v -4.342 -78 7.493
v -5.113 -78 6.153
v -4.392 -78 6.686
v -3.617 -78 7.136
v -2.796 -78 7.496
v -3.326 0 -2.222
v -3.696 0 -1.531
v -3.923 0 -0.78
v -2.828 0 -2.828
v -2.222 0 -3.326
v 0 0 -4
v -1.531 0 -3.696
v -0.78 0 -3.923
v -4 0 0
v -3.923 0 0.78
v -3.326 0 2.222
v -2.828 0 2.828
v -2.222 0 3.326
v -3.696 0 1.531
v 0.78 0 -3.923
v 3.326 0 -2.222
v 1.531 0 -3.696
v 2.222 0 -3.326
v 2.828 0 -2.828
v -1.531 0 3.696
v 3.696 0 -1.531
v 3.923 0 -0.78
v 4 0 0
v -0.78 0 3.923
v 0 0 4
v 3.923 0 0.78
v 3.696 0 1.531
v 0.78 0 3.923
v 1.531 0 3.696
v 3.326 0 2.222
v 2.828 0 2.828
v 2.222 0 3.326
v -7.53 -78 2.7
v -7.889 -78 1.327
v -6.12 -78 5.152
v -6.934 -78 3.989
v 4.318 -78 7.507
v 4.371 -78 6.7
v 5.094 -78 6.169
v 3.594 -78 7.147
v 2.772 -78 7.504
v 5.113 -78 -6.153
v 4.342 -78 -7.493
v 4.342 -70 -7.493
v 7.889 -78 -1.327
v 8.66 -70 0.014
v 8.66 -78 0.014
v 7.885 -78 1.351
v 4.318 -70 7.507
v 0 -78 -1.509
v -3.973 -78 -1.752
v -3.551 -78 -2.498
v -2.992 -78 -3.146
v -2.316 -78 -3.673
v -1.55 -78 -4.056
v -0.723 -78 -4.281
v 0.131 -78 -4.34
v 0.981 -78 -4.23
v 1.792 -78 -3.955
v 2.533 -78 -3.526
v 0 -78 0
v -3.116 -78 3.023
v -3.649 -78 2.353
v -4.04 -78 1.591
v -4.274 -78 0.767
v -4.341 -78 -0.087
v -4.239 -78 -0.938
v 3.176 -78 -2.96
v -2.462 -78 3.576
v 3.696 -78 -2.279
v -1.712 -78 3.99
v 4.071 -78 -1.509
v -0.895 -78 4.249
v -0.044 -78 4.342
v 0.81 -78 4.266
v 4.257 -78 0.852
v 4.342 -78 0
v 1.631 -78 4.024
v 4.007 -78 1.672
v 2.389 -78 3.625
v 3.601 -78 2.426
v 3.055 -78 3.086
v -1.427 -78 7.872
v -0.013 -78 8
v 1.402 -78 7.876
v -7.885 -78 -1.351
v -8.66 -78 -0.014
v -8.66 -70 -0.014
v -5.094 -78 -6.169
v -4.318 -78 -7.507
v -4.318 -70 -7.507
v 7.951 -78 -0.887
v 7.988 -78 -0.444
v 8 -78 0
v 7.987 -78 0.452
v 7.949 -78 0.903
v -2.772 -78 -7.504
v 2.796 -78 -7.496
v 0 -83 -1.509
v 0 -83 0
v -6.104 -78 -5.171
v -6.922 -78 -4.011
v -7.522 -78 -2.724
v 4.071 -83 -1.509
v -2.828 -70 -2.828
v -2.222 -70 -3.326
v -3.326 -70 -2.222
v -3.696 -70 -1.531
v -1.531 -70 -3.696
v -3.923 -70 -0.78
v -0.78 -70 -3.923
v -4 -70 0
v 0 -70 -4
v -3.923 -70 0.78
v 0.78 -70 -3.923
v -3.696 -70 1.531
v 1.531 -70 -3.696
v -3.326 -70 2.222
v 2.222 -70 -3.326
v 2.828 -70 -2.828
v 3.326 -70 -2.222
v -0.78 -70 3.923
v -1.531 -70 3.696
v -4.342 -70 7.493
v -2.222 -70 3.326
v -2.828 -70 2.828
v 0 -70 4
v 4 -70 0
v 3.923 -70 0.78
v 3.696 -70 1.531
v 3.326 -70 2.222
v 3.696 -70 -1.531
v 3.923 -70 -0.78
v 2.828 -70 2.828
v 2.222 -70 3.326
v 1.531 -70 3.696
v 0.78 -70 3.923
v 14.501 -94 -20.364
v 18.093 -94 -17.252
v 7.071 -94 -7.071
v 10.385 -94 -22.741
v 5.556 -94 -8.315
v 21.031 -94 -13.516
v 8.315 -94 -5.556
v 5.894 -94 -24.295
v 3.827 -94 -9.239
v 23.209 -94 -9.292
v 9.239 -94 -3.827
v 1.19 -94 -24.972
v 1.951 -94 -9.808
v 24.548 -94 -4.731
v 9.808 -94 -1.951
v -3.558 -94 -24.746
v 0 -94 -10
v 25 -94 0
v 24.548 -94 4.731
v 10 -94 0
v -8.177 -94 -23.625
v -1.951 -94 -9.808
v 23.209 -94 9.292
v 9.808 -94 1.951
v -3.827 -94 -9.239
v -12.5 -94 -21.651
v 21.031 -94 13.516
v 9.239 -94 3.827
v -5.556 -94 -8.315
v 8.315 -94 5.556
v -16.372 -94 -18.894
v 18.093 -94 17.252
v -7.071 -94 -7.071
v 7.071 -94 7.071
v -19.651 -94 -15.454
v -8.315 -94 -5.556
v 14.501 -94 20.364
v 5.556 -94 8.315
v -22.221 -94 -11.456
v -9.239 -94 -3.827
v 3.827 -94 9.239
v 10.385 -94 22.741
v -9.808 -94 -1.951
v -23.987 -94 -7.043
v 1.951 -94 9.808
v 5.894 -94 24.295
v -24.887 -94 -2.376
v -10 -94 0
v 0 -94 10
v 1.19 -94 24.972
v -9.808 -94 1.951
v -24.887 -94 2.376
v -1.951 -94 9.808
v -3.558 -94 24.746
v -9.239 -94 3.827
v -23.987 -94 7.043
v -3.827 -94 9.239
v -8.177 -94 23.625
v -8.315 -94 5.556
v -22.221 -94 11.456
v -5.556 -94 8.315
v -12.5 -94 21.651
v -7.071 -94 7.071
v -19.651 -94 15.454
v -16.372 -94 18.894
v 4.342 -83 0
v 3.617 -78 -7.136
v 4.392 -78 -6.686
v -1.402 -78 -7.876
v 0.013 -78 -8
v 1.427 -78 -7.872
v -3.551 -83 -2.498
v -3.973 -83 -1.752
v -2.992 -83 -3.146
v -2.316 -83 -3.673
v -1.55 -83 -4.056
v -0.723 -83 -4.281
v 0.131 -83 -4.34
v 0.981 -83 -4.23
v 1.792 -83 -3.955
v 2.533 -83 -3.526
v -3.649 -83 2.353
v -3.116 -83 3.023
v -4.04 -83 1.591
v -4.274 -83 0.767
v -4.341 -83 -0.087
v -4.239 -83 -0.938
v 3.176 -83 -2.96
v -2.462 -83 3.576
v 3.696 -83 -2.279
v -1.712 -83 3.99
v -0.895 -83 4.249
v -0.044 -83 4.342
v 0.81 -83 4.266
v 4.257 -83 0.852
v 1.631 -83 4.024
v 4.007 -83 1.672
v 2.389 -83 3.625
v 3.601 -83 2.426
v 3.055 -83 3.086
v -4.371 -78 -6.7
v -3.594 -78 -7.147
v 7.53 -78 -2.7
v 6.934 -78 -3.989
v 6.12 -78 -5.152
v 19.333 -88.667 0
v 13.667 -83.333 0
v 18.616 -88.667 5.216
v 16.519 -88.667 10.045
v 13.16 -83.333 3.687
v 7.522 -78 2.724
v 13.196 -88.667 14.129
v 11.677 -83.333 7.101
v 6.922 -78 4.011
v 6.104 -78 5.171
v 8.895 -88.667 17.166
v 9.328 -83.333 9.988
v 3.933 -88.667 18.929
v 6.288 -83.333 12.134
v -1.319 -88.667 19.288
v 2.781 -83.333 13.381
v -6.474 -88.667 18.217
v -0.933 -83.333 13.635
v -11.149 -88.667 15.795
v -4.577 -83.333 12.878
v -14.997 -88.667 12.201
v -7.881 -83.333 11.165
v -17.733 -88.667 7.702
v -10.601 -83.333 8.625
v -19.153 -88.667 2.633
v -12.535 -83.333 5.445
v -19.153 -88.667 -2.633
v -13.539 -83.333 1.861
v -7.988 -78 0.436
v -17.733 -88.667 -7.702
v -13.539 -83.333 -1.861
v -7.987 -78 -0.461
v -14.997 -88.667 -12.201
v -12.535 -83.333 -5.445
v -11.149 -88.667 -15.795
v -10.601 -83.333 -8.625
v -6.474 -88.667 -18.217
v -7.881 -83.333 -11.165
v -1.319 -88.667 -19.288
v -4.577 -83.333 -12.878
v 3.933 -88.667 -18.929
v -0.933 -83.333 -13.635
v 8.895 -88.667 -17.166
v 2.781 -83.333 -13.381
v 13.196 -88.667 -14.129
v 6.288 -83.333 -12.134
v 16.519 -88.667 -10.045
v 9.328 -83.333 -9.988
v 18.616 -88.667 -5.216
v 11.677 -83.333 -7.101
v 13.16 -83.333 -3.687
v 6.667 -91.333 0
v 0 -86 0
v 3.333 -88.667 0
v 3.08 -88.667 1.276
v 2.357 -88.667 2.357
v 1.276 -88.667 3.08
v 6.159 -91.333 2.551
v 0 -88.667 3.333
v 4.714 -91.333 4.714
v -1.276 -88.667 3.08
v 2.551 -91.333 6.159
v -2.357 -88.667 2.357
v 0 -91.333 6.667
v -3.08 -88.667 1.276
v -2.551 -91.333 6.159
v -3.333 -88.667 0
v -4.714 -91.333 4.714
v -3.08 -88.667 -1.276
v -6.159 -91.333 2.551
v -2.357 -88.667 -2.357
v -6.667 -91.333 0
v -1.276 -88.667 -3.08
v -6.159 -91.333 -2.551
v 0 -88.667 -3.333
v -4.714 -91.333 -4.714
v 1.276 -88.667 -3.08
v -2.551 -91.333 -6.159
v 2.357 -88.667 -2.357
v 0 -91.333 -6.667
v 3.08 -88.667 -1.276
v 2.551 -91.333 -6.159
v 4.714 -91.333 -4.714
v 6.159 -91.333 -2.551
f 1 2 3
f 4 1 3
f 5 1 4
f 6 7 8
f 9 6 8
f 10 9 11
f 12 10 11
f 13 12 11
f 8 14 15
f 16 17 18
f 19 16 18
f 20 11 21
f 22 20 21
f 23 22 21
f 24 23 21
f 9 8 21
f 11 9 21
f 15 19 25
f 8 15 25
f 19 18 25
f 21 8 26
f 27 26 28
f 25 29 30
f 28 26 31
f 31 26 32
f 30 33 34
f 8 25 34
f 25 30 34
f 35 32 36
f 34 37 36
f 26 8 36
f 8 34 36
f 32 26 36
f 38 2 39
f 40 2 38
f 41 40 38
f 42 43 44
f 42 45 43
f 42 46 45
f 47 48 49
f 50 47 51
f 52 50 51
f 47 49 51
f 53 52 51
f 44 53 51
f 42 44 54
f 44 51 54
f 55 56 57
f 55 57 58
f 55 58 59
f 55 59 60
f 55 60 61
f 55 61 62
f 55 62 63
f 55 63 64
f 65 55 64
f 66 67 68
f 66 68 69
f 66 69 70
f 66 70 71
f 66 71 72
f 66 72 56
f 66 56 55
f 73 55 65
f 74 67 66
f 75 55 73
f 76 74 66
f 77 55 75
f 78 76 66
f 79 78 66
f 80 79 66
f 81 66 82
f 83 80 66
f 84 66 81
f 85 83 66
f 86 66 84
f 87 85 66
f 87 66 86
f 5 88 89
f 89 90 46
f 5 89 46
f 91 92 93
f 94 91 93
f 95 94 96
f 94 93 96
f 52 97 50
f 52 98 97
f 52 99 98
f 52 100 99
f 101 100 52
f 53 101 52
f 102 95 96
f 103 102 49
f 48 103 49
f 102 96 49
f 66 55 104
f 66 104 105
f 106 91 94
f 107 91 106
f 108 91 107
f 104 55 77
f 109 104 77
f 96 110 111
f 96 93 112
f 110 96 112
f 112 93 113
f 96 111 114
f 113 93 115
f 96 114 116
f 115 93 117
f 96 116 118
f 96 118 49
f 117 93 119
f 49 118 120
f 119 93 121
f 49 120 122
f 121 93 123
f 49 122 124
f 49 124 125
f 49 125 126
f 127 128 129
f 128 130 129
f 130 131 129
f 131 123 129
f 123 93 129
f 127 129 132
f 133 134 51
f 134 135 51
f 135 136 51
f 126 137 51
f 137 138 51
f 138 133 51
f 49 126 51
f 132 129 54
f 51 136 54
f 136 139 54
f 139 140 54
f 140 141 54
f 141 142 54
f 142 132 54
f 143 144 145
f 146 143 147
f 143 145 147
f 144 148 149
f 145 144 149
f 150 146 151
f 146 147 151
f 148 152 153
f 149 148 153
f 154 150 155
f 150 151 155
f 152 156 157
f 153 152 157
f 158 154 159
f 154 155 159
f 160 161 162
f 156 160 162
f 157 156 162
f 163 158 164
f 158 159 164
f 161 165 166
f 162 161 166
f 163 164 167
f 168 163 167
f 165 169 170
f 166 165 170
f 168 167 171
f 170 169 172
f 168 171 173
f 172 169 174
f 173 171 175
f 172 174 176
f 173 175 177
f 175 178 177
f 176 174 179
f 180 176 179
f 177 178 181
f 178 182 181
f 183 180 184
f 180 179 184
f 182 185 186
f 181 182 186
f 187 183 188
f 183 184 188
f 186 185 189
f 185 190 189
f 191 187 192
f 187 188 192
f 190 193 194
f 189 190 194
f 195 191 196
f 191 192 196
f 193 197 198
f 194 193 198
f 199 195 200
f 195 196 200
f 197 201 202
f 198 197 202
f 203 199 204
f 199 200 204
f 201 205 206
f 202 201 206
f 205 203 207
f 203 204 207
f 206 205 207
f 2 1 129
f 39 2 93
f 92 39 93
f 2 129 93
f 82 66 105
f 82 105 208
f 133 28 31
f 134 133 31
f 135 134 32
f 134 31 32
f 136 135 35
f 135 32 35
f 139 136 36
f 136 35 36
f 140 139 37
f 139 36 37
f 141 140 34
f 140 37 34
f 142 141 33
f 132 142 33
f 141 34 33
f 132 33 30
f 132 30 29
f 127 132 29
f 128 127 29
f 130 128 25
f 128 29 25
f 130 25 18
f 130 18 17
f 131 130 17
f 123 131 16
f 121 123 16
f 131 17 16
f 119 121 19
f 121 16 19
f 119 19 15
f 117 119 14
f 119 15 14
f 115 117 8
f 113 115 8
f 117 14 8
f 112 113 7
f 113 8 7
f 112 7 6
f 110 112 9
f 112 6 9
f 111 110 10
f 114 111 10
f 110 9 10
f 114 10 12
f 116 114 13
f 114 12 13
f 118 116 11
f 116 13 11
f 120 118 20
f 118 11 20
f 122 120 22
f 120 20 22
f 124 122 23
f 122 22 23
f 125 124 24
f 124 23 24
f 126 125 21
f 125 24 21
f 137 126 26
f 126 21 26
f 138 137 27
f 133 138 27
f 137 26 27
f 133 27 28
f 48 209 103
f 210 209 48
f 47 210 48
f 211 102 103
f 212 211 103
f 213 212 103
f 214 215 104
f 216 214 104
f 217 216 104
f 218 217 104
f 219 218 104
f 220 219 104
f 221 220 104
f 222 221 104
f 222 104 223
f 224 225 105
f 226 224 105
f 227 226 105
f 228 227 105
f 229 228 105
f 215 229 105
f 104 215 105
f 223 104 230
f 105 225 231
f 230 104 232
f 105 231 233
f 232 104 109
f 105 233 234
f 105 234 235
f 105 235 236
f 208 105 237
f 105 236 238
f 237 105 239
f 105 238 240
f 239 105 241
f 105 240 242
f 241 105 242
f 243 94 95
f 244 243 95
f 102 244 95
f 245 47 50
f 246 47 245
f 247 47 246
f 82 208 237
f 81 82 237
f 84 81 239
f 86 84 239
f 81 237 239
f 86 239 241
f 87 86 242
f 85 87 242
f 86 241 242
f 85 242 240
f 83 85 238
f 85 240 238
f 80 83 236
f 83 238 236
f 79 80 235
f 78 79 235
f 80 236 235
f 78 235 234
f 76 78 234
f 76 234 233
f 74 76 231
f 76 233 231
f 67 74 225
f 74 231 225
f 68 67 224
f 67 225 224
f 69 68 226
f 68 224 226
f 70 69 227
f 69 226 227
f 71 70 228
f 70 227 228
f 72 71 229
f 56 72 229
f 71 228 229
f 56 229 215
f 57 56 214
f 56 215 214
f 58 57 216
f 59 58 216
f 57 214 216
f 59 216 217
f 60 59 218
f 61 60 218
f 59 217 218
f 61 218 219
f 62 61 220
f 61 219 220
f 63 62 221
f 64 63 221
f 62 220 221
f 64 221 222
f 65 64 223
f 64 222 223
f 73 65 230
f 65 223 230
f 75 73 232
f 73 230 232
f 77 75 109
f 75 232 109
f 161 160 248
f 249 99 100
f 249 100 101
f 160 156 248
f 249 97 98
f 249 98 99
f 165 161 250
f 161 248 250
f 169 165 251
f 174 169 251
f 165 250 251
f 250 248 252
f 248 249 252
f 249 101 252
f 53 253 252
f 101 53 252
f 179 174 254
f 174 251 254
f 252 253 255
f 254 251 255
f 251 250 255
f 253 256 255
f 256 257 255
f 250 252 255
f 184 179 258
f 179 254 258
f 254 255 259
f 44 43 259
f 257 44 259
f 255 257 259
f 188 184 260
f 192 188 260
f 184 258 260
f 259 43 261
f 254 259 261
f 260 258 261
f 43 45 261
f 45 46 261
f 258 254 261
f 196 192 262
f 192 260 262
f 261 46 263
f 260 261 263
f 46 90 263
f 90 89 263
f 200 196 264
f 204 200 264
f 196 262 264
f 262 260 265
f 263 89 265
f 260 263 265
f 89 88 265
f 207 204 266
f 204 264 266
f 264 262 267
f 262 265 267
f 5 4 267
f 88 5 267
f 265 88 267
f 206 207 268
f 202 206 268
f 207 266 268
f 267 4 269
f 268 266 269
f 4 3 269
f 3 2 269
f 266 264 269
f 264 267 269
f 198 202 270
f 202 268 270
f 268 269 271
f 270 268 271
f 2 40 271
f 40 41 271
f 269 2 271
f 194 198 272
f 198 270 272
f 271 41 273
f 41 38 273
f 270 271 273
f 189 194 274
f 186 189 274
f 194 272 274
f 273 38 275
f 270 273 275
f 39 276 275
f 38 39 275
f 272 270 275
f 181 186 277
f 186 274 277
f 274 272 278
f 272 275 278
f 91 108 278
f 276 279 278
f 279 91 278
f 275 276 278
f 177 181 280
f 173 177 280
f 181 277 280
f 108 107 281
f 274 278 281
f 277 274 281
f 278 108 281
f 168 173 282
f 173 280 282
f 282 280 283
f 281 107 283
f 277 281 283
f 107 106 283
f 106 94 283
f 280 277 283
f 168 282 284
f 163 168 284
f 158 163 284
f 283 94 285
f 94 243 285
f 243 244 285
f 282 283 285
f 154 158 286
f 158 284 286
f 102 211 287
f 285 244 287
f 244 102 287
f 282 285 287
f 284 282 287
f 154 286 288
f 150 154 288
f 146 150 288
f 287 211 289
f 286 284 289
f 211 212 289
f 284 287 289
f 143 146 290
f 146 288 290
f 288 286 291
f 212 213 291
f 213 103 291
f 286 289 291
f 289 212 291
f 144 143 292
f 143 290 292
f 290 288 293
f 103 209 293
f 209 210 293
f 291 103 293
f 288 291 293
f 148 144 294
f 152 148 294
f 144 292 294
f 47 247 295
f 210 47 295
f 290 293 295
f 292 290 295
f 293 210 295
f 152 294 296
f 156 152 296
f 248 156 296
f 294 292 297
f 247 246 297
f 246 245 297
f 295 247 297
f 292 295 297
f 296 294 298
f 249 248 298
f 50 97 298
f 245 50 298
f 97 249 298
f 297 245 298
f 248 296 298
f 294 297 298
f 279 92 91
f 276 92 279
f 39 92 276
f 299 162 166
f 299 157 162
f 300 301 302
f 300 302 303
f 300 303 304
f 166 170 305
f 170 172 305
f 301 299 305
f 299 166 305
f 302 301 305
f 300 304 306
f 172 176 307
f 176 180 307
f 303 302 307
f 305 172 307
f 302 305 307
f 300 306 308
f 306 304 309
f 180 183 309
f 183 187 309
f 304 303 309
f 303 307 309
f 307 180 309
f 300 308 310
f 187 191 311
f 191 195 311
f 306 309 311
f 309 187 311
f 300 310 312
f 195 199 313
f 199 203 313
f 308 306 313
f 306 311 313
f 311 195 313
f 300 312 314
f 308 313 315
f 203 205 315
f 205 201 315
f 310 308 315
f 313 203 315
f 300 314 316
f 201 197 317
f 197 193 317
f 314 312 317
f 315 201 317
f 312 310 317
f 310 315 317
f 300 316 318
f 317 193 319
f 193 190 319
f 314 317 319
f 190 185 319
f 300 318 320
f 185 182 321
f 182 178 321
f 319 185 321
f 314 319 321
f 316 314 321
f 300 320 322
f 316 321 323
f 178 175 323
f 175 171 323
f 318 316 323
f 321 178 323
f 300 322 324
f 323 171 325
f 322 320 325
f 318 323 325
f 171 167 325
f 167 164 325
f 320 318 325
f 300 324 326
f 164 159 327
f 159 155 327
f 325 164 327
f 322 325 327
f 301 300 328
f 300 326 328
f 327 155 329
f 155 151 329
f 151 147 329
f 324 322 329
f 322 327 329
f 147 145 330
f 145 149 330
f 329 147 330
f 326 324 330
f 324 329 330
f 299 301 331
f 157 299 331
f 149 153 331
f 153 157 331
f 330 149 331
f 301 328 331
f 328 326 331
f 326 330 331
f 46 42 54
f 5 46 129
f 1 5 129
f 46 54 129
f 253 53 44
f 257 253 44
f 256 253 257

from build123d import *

# Parameters (mm, degrees)
F0_R     = 4
F1_DEPTH = 70
F3_DEPTH = 8
F4_W     = 4.341884
F4_H     = 1.508987
F5_DEPTH = 5


with BuildPart() as f1:
    # F0 (on Front) → F1 (new body)
    with BuildSketch(Plane.XZ):
        Circle(F0_R)
    extrude(amount=F1_DEPTH)

    # F2 (on face) → F3 (join)
    with BuildSketch(Plane.XZ.offset(70)):
        Polygon((4.341884, -7.4932), (8.660243, 0.013582), (4.31836, 7.506782), (-4.341884, 7.4932), (-8.660243, -0.013582), (-4.31836, -7.506782), align=None)
    extrude(amount=F3_DEPTH)

    # F4 (on face) → F5 (join)
    with BuildSketch(Plane.XZ.offset(78)):
        with Locations((2.170942, -0.754493)):
            Rectangle(F4_W, F4_H)
    extrude(amount=F5_DEPTH)

    # F6 (on face) → F7 (revolve)
    with BuildSketch(Plane.XY):
        Polygon((4.341884, -83), (0, -83), (0, -86), (10, -94), (25, -94), (8, -78), (4.341884, -78), align=None)
    revolve(axis=Axis((0, -86, 0), (0, -1, 0)))


solid = f1.part
